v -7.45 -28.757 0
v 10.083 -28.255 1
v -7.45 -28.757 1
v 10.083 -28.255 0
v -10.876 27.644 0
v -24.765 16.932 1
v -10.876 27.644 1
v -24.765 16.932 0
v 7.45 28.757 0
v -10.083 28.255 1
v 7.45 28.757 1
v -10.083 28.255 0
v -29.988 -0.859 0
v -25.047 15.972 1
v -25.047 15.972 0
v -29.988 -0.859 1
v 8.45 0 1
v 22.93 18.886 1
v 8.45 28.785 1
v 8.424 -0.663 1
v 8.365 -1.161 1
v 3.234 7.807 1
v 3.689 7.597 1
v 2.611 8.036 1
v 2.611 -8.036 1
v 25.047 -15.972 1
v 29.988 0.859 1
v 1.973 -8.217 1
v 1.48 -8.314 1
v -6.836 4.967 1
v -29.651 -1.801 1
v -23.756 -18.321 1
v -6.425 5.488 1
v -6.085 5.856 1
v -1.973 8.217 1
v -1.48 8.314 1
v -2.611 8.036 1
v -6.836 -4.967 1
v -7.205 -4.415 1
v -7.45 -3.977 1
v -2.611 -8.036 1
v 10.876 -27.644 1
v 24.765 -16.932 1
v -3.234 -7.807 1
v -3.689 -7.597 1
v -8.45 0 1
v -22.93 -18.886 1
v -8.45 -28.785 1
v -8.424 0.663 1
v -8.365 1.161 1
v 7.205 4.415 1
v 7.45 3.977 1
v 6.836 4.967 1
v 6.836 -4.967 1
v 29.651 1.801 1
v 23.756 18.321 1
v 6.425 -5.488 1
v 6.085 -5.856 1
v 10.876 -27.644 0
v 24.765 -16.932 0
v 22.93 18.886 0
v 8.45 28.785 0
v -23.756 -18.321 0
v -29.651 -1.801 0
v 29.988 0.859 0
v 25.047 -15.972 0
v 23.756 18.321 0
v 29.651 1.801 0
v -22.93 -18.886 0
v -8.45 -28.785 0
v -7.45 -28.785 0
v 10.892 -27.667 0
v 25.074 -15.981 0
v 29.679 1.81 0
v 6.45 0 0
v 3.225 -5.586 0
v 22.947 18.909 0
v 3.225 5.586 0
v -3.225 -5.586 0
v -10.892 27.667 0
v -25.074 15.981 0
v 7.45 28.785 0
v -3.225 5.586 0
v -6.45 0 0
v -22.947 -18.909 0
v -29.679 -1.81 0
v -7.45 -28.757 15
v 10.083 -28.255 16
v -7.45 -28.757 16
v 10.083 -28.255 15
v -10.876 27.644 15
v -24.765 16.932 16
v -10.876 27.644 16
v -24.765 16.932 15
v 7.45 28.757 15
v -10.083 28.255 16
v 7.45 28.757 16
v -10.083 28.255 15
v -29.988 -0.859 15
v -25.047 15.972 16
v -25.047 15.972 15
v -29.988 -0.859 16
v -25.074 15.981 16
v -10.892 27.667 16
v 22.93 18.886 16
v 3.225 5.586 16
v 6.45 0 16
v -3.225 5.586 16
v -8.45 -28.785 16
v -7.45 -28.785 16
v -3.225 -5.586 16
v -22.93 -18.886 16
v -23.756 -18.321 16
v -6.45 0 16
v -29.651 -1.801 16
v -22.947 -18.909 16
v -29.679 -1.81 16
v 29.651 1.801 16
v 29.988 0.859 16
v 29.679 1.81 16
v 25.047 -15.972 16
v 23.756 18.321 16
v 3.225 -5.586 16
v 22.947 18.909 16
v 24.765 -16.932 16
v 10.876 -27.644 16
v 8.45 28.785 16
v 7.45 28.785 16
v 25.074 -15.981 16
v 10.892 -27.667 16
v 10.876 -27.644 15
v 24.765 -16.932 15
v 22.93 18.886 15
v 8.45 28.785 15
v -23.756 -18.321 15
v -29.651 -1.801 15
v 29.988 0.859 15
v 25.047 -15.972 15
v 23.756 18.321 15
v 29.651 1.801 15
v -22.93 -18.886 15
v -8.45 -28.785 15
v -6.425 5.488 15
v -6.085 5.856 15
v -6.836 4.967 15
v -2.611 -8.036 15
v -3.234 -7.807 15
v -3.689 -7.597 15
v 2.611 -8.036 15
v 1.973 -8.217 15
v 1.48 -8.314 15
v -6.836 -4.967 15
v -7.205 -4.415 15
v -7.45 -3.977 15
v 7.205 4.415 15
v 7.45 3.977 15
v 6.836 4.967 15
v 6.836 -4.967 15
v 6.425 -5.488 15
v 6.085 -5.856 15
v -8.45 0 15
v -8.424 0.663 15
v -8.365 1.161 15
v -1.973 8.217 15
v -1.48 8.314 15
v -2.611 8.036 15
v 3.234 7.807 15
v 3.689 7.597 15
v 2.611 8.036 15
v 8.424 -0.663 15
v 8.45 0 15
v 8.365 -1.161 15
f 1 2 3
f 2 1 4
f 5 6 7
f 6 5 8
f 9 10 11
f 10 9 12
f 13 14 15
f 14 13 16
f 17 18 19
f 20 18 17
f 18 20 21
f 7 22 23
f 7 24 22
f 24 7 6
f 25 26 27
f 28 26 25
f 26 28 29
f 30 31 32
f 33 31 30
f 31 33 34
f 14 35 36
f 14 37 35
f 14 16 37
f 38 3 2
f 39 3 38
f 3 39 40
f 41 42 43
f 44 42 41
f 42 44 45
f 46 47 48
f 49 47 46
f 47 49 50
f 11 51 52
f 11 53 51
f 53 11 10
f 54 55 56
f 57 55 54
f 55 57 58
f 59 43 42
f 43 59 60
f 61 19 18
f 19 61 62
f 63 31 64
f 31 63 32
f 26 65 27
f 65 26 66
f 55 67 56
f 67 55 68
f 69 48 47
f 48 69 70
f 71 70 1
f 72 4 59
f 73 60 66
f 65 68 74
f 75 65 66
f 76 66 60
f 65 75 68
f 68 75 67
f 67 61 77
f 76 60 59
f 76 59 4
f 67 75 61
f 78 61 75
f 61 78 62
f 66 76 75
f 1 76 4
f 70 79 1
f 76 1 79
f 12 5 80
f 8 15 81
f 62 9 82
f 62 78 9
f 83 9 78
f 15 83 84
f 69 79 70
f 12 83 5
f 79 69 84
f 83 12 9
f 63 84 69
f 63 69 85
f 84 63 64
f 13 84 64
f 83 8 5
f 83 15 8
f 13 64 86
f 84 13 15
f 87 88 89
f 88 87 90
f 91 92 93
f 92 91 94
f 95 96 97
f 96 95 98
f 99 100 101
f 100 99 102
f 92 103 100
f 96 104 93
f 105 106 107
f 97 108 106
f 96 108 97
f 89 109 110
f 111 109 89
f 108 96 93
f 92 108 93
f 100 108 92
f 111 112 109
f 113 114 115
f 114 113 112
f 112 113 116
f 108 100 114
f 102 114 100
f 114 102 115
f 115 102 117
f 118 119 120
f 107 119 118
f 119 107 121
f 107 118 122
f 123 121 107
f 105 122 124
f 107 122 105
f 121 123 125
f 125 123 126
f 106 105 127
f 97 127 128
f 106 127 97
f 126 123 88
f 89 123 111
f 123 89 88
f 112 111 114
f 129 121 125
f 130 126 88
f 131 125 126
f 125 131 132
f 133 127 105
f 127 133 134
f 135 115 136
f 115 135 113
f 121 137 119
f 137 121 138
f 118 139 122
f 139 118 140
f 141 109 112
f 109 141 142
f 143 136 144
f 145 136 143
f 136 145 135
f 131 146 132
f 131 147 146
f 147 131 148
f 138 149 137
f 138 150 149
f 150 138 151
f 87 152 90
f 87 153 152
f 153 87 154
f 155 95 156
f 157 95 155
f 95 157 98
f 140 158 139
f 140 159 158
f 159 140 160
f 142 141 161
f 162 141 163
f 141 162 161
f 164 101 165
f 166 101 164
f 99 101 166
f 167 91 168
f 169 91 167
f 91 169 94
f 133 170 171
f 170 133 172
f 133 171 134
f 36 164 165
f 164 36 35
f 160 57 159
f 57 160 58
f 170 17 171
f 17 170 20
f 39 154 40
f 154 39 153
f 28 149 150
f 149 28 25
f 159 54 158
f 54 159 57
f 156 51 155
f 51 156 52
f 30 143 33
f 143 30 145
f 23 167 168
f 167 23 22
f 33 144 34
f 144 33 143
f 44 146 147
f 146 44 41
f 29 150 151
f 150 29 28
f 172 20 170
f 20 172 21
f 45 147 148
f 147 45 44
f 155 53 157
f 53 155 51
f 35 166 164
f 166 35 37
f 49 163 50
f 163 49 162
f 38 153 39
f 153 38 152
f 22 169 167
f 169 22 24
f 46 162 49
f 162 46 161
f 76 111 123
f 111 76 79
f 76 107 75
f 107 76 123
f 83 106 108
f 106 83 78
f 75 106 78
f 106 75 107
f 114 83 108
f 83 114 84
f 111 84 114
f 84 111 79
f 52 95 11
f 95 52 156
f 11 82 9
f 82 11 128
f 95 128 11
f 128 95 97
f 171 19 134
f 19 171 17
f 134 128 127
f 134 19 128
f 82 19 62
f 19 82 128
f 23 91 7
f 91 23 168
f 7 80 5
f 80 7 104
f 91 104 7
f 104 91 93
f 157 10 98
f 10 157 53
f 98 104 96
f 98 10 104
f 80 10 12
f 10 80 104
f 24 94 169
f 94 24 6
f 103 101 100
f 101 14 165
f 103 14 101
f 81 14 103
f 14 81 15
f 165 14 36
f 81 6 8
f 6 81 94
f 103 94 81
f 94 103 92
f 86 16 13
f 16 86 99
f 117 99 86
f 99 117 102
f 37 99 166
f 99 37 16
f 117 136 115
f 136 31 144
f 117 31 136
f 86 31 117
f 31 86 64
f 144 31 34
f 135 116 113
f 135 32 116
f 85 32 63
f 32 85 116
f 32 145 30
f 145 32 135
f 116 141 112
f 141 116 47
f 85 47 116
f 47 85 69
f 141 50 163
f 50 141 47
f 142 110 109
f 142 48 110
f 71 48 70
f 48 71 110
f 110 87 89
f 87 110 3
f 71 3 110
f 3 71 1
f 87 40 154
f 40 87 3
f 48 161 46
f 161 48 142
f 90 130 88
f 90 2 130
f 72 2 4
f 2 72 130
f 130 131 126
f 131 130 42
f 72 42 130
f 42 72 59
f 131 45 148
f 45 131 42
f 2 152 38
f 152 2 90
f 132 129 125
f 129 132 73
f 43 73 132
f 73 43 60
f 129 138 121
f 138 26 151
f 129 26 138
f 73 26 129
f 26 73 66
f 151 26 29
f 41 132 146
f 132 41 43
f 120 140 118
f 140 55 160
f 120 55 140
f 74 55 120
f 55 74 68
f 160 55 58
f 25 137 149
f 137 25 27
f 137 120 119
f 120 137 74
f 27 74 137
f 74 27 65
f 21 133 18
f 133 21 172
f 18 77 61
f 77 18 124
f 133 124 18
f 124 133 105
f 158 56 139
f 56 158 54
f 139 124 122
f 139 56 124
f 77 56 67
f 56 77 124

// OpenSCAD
// file: inc/constants.scad
pi=3.1415;
$fn=80;
//hole radius
hr = 6;

//distance between holes
dh = 12;

//x distance between holes
dhx = 12;

//y distance between holes
dhy = 14.4;

//give between two gears
giveg = .5;

//shaft give
sgive = .6;

//plug give
//pgive = .15;

pgive = .12;


//fastener give (holes)
fgive = .13;

pitch=.25;

//gear give (hole)
ggive = .45;

//spacer give
spgive = .3;


////fastener sizes
//notch width
notchw = 0;

//notch height
notchh = 0;

//fastener height
fh = 4;

//fastener width (sans notch)
fw = hr;


//gear hole radius
ghr = 1.4;

//arrow length
al = 8;


//give for the nut
nut_give = .8;
// main file
include <inc/constants.scad>
//$fn = 10;
//outer radius
or = 30;

//inner radius
ir = hr+ggive+2;

//wall thickness
wth = 1;

//total height
th = 16;

//number of flanges
nf = 10;

//number of flanges
angle = 360/nf;
//extra angle
ea = 90;

p = ea-asin(ir*sin(180-ea)/or);

x = sin(p)*ir/(sin(ea-p));


module waterwheel()
{

difference()
{
union()
{
//outer walls
rotate([0,0,p])
{
cylinder(r=or, h=wth, $fn=nf);
translate([0,0,th-wth])
cylinder(r=or, h=wth, $fn=nf);
}

//inner cylinder
cylinder(r=ir, h=th);
}
cylinder(r=hr+ggive, h=th+1, $fn=6);


}




//flanges
for(i=[0:nf])
{
translate([cos(i*angle)*ir,sin(i*angle)*ir,0])
rotate([0,0,i*angle+ea])
cube([x,1,th]);
}

}




waterwheel();
